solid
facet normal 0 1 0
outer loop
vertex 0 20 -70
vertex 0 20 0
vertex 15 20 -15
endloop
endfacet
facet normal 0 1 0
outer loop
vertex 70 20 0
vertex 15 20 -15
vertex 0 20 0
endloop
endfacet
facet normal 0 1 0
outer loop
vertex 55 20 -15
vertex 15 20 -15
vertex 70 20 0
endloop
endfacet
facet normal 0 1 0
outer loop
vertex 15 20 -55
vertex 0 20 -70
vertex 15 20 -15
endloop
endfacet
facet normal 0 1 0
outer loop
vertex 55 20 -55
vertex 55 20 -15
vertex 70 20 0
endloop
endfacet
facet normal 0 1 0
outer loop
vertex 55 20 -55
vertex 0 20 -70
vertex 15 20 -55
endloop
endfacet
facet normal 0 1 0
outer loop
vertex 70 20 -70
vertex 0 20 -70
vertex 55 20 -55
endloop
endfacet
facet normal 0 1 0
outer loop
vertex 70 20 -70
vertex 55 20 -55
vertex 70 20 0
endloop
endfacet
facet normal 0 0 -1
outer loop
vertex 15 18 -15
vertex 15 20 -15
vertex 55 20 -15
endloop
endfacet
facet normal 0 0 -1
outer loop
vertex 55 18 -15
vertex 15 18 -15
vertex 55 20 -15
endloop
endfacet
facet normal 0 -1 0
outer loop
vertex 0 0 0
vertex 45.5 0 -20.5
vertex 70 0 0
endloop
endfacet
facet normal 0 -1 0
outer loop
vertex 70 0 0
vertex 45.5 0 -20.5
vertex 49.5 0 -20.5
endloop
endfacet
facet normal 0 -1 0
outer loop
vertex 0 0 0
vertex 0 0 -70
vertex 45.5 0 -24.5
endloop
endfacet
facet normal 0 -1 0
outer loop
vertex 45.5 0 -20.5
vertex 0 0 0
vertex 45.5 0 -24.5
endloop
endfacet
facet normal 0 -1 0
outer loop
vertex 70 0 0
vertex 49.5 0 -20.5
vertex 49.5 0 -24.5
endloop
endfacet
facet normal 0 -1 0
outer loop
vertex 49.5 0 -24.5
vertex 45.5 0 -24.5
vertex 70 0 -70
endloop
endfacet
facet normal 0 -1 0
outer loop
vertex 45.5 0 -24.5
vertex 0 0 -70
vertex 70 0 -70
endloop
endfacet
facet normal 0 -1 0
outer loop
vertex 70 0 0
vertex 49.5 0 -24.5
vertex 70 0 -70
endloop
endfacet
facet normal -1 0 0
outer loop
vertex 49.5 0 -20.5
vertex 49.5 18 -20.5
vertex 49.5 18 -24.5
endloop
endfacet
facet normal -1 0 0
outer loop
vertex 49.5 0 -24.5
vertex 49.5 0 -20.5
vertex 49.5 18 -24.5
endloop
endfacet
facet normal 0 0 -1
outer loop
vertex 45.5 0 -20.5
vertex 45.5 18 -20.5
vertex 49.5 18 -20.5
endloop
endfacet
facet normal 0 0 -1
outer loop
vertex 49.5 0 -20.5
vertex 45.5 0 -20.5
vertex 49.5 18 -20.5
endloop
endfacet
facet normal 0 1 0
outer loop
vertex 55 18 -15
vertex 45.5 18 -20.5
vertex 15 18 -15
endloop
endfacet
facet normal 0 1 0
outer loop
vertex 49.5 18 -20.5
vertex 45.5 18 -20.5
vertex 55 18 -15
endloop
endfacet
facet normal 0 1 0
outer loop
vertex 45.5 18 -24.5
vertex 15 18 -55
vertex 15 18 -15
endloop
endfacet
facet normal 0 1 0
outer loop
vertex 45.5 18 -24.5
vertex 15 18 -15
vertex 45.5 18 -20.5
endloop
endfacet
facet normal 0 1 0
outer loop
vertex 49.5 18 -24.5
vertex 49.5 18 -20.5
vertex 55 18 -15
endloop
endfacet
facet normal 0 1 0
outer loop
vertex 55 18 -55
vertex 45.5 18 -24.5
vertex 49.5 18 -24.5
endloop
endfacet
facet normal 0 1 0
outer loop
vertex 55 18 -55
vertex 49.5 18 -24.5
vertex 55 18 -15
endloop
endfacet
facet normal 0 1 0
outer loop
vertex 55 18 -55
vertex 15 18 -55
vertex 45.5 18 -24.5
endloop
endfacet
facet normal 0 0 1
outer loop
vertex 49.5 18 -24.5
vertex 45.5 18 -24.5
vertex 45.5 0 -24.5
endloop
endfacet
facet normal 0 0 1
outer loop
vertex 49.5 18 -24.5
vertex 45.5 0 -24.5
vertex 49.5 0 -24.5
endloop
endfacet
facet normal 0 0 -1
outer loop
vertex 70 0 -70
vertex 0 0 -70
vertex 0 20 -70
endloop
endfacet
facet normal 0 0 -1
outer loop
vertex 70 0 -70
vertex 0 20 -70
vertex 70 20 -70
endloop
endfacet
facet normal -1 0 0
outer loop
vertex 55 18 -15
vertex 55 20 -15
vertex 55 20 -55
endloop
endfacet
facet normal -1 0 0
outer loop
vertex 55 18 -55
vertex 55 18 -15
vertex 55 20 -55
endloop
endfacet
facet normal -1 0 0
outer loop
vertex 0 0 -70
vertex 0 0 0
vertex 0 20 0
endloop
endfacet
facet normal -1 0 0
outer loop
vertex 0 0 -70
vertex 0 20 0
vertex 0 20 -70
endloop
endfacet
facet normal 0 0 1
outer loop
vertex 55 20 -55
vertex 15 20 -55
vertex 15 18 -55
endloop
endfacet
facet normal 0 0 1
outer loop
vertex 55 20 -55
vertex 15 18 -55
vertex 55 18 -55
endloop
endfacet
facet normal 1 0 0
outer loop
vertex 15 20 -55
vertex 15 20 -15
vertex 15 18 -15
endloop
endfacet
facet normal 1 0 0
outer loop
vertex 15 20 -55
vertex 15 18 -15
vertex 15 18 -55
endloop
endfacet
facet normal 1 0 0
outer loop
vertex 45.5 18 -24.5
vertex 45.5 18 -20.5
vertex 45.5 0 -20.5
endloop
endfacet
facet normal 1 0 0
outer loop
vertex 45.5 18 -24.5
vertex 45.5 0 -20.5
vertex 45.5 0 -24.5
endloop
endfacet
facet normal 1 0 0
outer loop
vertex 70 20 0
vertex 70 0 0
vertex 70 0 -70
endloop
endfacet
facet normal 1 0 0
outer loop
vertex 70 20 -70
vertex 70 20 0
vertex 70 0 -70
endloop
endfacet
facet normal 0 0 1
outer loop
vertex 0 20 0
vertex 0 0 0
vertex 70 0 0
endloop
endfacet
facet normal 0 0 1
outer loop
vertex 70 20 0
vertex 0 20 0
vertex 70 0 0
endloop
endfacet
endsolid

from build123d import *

# Parameters (mm, degrees)
CROQUIS1_W              = 70
CROQUIS1_H              = 70
SALIENTE_EXTRUIR1_DEPTH = 20
CROQUIS2_W              = 40
CROQUIS2_H              = 40
CORTAR_EXTRUIR1_DEPTH   = 2
CROQUIS3_W              = 4
CROQUIS3_H              = 4
CORTAR_EXTRUIR2_DEPTH   = 55


with BuildPart() as part:
    # Croquis1 → Saliente-Extruir1 (new body)
    with BuildSketch(Plane(origin=(0, 0, 0), x_dir=(1, 0, 0), z_dir=(0, 1, 0))):
        with Locations((35, 35)):
            Rectangle(CROQUIS1_W, CROQUIS1_H)
    extrude(amount=SALIENTE_EXTRUIR1_DEPTH)

    # Croquis2 → Cortar-Extruir1 (cut)
    with BuildSketch(Plane(origin=(0, 20, 0), x_dir=(1, 0, 0), z_dir=(0, 1, 0))):
        with Locations((35, 35)):
            Rectangle(CROQUIS2_W, CROQUIS2_H)
    extrude(amount=-CORTAR_EXTRUIR1_DEPTH, mode=Mode.SUBTRACT)

    # Croquis3 → Cortar-Extruir2 (cut)
    with BuildSketch(Plane(origin=(0, 18, 0), x_dir=(1, 0, 0), z_dir=(0, 1, 0))):
        with Locations((47.5, 22.5)):
            Rectangle(CROQUIS3_W, CROQUIS3_H)
    extrude(amount=-CORTAR_EXTRUIR2_DEPTH, mode=Mode.SUBTRACT)


solid = part.part
